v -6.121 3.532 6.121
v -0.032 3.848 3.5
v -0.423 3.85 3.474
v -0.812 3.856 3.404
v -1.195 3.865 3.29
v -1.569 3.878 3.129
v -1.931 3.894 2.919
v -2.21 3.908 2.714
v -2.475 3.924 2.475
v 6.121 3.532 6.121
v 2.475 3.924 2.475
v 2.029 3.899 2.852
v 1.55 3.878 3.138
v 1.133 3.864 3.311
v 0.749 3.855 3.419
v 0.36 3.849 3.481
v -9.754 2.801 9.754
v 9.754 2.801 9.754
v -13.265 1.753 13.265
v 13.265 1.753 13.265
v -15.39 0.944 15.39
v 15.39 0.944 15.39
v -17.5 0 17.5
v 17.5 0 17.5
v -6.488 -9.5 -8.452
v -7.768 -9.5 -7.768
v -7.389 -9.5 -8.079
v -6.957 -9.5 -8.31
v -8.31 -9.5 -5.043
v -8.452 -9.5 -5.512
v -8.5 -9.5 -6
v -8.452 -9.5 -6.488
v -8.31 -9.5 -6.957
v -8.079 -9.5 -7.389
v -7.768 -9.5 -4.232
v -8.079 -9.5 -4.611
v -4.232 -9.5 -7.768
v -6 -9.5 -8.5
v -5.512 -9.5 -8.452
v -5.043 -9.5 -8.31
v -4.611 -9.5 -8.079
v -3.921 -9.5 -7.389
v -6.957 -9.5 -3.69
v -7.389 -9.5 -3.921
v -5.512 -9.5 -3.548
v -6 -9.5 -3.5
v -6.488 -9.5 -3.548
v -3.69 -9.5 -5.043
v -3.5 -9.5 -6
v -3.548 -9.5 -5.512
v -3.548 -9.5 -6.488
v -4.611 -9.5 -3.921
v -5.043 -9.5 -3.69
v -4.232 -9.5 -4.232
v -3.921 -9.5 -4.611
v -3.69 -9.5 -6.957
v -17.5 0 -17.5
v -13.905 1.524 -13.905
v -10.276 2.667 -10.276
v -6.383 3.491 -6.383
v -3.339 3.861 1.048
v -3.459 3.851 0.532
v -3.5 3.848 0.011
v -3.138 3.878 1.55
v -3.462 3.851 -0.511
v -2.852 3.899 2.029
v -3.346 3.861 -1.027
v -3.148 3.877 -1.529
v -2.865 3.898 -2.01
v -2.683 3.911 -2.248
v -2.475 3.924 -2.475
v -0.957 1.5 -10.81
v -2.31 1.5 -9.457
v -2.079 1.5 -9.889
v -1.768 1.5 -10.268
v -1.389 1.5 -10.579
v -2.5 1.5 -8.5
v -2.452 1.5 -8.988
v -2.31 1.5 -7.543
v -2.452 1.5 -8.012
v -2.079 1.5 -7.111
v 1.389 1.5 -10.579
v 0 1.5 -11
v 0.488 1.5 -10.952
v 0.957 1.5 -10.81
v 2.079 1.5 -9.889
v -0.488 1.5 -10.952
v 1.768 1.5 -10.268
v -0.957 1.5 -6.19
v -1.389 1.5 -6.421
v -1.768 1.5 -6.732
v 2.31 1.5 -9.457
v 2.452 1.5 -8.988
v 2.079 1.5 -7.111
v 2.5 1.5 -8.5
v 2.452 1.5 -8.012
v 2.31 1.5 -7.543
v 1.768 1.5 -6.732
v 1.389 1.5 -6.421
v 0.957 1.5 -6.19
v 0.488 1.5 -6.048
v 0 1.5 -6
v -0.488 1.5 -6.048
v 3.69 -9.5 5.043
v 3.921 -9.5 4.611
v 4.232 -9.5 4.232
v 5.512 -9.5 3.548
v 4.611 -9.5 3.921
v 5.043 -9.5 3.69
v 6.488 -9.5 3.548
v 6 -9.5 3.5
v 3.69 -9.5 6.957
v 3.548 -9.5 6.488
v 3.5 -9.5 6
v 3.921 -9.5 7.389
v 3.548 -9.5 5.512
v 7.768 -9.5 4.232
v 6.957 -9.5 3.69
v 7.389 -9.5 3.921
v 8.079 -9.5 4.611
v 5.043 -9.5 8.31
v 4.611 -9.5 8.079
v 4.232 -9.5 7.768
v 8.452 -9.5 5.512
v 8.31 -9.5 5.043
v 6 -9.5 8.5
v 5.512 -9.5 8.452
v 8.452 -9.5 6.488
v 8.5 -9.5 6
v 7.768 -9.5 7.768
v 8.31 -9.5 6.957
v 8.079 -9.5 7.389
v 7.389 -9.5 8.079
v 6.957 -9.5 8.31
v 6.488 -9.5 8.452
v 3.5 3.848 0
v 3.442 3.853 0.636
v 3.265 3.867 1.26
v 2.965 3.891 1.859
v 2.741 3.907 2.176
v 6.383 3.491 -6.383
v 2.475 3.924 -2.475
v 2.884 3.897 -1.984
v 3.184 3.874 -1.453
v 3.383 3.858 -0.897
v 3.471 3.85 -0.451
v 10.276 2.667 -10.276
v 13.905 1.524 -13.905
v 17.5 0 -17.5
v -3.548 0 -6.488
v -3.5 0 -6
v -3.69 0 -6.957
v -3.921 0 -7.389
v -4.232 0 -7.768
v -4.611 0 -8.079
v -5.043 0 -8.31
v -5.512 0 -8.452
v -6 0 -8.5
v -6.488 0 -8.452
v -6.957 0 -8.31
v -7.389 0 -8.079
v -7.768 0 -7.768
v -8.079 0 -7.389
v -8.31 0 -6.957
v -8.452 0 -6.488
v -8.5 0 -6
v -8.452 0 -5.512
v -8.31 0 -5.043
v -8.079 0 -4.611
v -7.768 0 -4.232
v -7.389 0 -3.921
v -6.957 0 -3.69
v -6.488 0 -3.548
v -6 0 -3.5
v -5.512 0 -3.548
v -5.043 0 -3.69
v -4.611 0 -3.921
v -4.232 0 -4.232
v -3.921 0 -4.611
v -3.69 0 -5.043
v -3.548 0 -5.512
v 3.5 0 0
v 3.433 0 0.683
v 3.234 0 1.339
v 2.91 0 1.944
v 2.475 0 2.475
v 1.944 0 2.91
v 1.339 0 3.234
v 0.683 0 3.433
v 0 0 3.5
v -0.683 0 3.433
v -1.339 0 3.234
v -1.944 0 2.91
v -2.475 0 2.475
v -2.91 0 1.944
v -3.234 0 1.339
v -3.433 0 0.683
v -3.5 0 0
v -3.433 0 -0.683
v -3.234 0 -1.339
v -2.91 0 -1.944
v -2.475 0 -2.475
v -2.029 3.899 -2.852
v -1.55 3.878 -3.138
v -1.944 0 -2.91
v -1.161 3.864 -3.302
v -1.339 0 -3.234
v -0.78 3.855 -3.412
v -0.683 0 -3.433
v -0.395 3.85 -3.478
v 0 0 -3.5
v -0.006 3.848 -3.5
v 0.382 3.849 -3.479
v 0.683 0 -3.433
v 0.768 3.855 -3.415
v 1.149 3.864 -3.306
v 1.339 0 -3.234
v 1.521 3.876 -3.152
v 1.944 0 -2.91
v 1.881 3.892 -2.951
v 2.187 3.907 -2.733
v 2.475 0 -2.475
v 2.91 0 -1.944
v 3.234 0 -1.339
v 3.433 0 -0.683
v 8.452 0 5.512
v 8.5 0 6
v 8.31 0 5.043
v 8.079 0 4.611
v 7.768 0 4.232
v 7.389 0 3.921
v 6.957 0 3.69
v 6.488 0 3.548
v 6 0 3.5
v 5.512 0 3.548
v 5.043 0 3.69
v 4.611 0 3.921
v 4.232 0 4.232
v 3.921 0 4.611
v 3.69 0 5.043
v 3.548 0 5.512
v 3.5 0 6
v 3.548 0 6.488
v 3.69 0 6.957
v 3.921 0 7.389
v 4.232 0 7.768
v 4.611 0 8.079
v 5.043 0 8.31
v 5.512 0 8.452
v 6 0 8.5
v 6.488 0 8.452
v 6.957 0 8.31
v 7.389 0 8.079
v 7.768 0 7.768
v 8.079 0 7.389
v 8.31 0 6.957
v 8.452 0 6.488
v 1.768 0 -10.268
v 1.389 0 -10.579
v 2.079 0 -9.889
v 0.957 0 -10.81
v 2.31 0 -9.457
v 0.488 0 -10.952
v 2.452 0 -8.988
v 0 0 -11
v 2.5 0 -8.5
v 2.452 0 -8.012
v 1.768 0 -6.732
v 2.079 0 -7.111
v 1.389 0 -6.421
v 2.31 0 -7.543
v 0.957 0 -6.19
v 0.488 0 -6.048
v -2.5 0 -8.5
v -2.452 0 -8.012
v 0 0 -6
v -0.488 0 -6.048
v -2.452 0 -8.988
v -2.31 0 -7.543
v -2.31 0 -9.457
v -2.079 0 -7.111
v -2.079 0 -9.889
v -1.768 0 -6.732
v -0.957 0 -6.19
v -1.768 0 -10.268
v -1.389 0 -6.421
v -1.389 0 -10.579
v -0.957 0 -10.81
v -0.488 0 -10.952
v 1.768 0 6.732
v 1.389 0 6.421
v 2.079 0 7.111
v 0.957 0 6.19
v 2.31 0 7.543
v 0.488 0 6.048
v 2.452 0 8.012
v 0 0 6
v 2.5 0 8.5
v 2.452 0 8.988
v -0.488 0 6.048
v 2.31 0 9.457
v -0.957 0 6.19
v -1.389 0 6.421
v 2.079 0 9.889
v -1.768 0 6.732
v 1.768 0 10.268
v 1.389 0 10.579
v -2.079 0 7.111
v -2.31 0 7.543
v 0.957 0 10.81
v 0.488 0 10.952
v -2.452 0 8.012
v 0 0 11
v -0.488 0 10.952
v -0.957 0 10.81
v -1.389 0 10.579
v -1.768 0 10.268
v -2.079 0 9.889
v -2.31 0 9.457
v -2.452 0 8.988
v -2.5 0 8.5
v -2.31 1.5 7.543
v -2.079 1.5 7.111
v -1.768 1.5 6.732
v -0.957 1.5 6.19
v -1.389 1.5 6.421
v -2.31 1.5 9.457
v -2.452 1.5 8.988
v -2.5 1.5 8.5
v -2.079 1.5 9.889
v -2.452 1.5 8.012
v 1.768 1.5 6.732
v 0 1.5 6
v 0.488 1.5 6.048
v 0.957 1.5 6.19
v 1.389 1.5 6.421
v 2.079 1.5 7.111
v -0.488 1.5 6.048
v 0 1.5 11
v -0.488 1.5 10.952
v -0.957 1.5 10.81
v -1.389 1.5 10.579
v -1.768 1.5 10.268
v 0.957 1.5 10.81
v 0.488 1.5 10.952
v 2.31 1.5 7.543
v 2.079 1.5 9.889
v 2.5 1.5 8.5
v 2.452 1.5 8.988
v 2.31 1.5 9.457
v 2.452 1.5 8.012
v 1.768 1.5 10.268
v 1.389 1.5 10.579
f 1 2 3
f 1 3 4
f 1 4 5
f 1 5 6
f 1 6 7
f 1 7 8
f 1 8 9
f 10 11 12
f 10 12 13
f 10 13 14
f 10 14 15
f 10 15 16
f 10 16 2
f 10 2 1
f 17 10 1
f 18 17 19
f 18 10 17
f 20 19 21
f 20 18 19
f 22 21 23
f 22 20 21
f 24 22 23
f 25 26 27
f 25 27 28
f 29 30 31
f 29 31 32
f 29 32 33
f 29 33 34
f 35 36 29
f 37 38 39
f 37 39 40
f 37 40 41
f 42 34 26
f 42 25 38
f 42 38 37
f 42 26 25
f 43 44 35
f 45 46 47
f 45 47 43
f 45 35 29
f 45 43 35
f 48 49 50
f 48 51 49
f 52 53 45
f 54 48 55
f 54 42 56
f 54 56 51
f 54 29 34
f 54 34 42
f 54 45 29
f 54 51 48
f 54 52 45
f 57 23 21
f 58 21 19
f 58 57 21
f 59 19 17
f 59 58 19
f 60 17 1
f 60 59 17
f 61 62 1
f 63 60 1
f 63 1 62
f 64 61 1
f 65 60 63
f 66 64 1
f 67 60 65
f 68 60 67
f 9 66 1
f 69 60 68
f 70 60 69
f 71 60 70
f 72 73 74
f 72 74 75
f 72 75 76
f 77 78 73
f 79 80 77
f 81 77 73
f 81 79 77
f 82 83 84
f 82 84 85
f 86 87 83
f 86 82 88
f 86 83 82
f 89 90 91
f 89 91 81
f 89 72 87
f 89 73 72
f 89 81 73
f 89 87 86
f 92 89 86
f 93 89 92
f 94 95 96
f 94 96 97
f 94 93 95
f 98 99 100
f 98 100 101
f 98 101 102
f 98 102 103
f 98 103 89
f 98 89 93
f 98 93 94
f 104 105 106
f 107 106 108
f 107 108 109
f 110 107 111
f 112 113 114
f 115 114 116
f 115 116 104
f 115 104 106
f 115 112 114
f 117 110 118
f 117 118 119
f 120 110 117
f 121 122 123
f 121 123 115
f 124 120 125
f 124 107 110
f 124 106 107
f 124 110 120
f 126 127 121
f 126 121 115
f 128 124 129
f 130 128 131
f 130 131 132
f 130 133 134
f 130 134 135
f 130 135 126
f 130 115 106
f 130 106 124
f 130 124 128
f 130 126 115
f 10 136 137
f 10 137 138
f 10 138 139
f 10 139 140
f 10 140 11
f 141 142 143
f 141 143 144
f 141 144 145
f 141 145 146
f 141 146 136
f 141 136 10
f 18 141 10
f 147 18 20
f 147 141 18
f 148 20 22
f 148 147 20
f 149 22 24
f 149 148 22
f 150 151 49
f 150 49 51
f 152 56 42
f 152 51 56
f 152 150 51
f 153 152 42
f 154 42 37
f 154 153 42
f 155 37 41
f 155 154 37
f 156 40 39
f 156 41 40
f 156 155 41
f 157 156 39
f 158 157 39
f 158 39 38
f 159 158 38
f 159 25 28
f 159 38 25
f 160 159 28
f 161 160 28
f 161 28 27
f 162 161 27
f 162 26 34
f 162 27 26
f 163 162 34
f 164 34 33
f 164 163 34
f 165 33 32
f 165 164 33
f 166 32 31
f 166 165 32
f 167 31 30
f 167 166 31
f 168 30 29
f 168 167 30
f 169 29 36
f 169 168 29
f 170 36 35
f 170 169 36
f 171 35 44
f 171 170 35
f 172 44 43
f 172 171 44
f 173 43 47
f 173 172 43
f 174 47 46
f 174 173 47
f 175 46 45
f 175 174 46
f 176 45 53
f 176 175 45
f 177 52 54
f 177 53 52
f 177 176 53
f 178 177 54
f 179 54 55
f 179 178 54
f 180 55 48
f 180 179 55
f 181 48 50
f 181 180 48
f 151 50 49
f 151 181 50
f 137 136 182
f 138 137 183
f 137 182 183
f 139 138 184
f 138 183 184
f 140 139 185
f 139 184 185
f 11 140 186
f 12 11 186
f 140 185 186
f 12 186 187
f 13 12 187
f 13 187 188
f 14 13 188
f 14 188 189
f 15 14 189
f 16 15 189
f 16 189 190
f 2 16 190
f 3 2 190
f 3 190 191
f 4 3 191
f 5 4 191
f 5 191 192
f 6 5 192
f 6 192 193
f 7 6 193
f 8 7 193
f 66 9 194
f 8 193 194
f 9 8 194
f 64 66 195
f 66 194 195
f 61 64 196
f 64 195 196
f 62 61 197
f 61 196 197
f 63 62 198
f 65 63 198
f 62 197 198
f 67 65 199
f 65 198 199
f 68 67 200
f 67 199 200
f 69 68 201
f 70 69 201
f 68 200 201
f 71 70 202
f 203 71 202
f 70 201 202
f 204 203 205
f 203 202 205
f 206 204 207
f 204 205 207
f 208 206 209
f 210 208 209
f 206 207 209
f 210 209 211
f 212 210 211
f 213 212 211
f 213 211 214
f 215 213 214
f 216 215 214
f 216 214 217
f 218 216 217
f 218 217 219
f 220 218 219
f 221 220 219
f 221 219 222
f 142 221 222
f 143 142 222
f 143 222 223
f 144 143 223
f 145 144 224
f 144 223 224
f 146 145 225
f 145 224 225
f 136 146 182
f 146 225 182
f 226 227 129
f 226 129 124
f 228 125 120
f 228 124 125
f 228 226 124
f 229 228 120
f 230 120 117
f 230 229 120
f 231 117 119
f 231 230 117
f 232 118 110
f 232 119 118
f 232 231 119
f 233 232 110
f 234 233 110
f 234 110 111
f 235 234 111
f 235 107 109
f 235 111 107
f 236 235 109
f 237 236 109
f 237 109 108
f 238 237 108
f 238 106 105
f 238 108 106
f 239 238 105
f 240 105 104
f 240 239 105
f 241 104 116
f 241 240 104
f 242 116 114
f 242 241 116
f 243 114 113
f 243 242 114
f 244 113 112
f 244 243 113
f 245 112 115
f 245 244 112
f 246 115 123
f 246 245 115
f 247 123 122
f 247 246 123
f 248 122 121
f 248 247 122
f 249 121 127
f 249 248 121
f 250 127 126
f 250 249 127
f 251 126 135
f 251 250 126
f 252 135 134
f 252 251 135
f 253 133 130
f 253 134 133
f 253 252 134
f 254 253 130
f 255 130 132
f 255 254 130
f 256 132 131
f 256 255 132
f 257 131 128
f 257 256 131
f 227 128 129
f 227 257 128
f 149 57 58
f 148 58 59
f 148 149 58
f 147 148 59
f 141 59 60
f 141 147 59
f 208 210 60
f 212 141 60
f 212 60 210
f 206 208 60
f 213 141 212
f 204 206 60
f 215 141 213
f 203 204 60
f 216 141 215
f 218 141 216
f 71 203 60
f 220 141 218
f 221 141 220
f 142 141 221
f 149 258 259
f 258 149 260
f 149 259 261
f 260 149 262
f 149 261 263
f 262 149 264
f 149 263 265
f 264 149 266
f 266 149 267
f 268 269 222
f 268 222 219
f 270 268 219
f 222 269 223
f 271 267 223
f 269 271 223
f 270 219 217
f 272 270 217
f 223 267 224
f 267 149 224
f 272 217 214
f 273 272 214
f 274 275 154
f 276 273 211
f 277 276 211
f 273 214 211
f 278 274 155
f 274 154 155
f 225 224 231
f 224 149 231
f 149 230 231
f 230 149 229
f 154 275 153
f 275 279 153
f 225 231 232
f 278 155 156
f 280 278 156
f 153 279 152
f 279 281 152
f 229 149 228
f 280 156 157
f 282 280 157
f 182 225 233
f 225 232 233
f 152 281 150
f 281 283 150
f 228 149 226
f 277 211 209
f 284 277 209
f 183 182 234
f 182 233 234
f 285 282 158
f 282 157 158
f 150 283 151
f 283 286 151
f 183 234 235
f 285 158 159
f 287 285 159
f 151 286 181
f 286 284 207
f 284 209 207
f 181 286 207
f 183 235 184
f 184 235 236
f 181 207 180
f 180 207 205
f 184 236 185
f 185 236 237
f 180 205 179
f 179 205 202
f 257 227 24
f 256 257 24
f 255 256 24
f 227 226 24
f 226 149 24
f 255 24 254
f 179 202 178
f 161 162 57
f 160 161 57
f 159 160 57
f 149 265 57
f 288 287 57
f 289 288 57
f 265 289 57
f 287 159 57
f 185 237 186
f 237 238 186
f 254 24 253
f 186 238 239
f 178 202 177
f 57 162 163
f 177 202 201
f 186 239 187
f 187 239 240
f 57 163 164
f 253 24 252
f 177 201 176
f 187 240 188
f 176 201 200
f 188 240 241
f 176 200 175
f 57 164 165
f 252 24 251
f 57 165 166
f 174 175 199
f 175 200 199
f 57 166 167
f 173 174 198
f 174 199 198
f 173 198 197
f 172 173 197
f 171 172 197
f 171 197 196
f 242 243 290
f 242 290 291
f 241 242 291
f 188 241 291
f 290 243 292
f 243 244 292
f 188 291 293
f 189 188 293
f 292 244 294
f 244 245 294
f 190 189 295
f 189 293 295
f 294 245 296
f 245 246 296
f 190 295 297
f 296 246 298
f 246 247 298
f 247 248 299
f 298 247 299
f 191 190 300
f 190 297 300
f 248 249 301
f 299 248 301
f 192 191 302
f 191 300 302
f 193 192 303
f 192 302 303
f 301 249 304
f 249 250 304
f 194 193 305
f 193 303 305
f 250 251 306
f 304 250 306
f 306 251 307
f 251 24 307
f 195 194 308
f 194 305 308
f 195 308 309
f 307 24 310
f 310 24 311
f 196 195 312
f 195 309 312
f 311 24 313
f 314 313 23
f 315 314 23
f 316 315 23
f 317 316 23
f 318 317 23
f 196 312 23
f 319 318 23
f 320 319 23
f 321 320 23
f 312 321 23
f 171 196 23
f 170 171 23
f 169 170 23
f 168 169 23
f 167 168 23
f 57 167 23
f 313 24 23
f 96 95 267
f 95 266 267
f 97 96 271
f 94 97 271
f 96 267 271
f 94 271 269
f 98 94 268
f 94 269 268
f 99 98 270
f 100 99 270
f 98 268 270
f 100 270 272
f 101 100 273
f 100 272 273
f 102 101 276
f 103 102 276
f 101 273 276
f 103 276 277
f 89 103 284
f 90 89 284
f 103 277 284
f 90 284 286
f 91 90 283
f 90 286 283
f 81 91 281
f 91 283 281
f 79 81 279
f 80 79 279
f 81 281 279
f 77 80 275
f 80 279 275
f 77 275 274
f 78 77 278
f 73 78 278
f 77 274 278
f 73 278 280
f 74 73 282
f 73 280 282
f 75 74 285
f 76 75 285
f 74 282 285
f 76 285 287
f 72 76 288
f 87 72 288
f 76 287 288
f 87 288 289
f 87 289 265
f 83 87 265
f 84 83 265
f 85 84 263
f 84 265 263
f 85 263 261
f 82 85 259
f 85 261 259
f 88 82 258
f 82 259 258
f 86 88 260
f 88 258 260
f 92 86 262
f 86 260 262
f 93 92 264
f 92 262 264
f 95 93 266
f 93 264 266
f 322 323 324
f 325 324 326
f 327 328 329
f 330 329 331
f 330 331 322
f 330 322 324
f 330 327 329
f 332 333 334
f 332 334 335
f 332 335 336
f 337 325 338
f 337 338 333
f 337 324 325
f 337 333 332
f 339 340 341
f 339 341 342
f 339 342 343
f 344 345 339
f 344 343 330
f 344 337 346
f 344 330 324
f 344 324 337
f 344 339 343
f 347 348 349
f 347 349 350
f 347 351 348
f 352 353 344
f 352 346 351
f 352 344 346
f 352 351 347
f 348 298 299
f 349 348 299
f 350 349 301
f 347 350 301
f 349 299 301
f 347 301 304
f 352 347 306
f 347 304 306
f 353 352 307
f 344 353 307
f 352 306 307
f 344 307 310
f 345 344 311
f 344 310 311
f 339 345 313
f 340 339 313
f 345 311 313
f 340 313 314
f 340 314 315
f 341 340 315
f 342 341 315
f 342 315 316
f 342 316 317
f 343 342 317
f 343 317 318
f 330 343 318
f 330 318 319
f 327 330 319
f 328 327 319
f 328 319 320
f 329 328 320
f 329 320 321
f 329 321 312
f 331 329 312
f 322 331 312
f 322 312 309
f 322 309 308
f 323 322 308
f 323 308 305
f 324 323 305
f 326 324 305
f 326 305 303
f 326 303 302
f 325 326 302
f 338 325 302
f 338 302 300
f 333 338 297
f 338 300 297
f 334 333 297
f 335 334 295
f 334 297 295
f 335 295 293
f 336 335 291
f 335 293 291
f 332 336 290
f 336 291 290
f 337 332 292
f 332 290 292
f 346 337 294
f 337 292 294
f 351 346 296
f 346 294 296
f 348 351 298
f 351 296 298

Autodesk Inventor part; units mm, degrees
ref_plane "YZ Plane" through (0, 0, 0) normal (1, 0, 0) x (0, 1, 0)
ref_plane "XZ Plane" through (0, 0, 0) normal (0, 1, 0) x (-1, 0, 0)
ref_plane "XY Plane" through (0, 0, 0) normal (0, 0, 1) x (1, 0, 0)
sketch "Sketch1" plane through (0, 0, 0) normal (0, 1, 0) x (-1, 0, 0)
  line L0 (17.5, -17.5) -> (-17.5, -17.5)
  line L1 (-17.5, -17.5) -> (-17.5, 17.5)
  line L2 (-17.5, 17.5) -> (17.5, 17.5)
  line L3 (17.5, 17.5) -> (17.5, -17.5)
  line L4 (17.5, -17.5) -> (-17.5, 17.5) construction
  line L5 (-17.5, -17.5) -> (17.5, 17.5) construction
  point P0 (0, 0)
  dimension "d0" = 35
  dimension "d1" = 35
extrude "Extrusion1" add sketch "Sketch1" along normal blind 4
sketch "Sketch3" plane through (17.5, 0, 17.5) normal (1, 0, 0) x (0, 0, -1)
  line L0 (35, 4) -> (0, 4) projected
  line L1 (0, 0) -> (35, 0) projected
  line L2 (0, 0) -> (35, 0)
  arc A0 (35, 0) -> (0, 0) centre (17.5, -36.2813) ccw
  point P0 (17.5, 4)
extrude "Extrusion3" cut sketch "Sketch3" against normal through all keep common part
sketch "Sketch4" plane through (17.5, 0, -17.5) normal (0, 0, -1) x (-1, 0, 0)
  line L0 (35, 0) -> (35, 4) projected
  line L1 (0, 0) -> (35, 0)
  line L2 (0, 0) -> (0, 4) projected
  line L3 (35, 0) -> (0, 0) projected
  arc A0 (35, 0) -> (0, 0) centre (17.5, -36.2812) ccw
  point P0 (17.5, 0)
  dimension "d31" = 4
extrude "Extrusion4" cut sketch "Sketch4" against normal through all keep common part
sketch "Sketch5" plane through (0, 0, 0) normal (0, -1, 0) x (1, 0, 0)
  circle A0 centre (0, 0) radius 3.5
  dimension "d14" = 7
extrude "Extrusion5" cut sketch "Sketch5" against normal through all
sketch "Sketch6" plane through (0, 0, 0) normal (0, -1, 0) x (1, 0, 0)
  circle A0 centre (-6, -6) radius 2.5
  circle A1 centre (6, 6) radius 2.5
  circle A2 centre (6, -6) radius 2.5
  circle A3 centre (-6, 6) radius 2.5
  point P0 (0, 0)
  point P1 (0, 0)
  dimension "d17" = 5
  dimension "d18" = 5
  dimension "d19" = 6
  dimension "d20" = 6
  dimension "d21" = 6
  dimension "d22" = 6
  dimension "d25" = 5
  dimension "d26" = 5
  dimension "d27" = 6
  dimension "d28" = 6
  dimension "d29" = 6
  dimension "d30" = 6
extrude "Extrusion6" add sketch "Sketch6" along normal blind 9.5 contours A0 | A1
sketch "Sketch7" plane through (0, 0, 0) normal (0, -1, 0) x (1, 0, 0)
  line L0 (-17.5, 17.5) -> (-17.5, -17.5) construction
  line L1 (-17.5, 0) -> (17.5, 0) construction
  line L2 (17.5, -17.5) -> (17.5, 17.5) construction
  circle A0 centre (0, 8.5) radius 2.5
  circle A1 centre (0, -8.5) radius 2.5
  line L3 (0, 0) -> (0, 8.5) construction
  dimension "d32" = 5
  dimension "d33" = 8.5
extrude "Extrusion7" cut sketch "Sketch7" against normal blind 1.5
equation "\"d1\" = d0"
equation "\"d17\" = d18"
equation "\"d19\" = d21"
equation "\"d20\" = d27"
equation "\"d22\" = d27"
equation "\"d25\" = d18"
equation "\"d26\" = d18"
equation "\"d27\" = d21"
equation "\"d28\" = d21"
equation "\"d29\" = d21"
equation "\"d30\" = d21"
properties part number "thumper-bumper-trigger-v2"
